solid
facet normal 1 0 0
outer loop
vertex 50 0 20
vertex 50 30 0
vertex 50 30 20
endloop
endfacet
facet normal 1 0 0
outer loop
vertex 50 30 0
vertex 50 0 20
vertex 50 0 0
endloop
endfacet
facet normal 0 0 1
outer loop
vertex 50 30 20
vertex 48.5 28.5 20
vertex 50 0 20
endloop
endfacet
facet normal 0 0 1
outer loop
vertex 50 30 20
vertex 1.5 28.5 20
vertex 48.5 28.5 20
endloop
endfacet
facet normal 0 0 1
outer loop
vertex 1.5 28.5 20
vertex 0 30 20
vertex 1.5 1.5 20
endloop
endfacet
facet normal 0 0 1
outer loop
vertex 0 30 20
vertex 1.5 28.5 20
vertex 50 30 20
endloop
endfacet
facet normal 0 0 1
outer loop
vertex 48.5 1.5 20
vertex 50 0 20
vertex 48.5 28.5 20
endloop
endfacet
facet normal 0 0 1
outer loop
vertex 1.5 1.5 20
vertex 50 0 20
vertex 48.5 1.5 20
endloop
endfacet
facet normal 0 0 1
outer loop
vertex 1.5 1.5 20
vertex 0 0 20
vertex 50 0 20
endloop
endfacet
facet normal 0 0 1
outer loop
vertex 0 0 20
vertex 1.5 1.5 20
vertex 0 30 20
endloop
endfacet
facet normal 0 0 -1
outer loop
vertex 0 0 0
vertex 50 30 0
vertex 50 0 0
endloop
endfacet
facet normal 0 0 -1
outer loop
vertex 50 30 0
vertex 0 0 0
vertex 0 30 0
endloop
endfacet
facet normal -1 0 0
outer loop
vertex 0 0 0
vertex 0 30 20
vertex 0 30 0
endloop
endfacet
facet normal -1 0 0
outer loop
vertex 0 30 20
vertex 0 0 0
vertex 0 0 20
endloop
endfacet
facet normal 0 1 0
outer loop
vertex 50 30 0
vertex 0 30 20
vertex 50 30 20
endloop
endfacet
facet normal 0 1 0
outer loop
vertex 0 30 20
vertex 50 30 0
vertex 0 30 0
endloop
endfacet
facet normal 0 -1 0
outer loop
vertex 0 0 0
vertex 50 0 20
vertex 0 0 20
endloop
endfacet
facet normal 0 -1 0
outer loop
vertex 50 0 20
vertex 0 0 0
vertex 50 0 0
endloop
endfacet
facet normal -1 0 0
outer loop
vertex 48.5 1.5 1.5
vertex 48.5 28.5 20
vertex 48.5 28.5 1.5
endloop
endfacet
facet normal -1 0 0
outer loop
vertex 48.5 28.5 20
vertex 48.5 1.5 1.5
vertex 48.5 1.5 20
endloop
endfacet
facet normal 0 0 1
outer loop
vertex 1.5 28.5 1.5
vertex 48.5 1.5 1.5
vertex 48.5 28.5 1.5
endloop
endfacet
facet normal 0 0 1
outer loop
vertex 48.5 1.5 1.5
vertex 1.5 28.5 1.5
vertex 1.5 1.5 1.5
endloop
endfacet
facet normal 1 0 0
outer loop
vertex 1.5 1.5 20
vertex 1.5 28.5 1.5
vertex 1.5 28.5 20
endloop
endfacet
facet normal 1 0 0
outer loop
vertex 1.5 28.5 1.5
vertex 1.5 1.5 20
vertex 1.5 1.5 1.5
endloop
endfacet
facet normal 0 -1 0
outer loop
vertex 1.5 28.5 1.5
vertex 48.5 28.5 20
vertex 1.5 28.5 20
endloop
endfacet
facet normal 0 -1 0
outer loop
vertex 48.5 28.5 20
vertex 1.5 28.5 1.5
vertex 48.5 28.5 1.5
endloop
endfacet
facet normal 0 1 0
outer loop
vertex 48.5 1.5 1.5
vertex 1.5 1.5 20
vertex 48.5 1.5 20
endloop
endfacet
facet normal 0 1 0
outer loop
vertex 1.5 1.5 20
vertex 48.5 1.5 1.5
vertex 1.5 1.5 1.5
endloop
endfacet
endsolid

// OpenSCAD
$fn = 32;

// ----------------------------------------------------------------------
// Open box: 1.5 mm walls
// ----------------------------------------------------------------------

// --- parameters (mm) ---
box_l = 50;               // outer length, X
box_w = 30;               // outer width, Y
box_h = 20;               // outer height, Z
wall = 1.5;               // wall thickness
floor = 1.5;              // floor thickness
fit_tol = 0.05;           // tolerance for press fits, mm
free_tol = 0.2;           // tolerance for clearance fits, mm

difference() {
  cube([box_l, box_w, box_h]);
  translate([wall, wall, floor])
    cube([box_l - 2 * wall, box_w - 2 * wall, box_h]);
}
